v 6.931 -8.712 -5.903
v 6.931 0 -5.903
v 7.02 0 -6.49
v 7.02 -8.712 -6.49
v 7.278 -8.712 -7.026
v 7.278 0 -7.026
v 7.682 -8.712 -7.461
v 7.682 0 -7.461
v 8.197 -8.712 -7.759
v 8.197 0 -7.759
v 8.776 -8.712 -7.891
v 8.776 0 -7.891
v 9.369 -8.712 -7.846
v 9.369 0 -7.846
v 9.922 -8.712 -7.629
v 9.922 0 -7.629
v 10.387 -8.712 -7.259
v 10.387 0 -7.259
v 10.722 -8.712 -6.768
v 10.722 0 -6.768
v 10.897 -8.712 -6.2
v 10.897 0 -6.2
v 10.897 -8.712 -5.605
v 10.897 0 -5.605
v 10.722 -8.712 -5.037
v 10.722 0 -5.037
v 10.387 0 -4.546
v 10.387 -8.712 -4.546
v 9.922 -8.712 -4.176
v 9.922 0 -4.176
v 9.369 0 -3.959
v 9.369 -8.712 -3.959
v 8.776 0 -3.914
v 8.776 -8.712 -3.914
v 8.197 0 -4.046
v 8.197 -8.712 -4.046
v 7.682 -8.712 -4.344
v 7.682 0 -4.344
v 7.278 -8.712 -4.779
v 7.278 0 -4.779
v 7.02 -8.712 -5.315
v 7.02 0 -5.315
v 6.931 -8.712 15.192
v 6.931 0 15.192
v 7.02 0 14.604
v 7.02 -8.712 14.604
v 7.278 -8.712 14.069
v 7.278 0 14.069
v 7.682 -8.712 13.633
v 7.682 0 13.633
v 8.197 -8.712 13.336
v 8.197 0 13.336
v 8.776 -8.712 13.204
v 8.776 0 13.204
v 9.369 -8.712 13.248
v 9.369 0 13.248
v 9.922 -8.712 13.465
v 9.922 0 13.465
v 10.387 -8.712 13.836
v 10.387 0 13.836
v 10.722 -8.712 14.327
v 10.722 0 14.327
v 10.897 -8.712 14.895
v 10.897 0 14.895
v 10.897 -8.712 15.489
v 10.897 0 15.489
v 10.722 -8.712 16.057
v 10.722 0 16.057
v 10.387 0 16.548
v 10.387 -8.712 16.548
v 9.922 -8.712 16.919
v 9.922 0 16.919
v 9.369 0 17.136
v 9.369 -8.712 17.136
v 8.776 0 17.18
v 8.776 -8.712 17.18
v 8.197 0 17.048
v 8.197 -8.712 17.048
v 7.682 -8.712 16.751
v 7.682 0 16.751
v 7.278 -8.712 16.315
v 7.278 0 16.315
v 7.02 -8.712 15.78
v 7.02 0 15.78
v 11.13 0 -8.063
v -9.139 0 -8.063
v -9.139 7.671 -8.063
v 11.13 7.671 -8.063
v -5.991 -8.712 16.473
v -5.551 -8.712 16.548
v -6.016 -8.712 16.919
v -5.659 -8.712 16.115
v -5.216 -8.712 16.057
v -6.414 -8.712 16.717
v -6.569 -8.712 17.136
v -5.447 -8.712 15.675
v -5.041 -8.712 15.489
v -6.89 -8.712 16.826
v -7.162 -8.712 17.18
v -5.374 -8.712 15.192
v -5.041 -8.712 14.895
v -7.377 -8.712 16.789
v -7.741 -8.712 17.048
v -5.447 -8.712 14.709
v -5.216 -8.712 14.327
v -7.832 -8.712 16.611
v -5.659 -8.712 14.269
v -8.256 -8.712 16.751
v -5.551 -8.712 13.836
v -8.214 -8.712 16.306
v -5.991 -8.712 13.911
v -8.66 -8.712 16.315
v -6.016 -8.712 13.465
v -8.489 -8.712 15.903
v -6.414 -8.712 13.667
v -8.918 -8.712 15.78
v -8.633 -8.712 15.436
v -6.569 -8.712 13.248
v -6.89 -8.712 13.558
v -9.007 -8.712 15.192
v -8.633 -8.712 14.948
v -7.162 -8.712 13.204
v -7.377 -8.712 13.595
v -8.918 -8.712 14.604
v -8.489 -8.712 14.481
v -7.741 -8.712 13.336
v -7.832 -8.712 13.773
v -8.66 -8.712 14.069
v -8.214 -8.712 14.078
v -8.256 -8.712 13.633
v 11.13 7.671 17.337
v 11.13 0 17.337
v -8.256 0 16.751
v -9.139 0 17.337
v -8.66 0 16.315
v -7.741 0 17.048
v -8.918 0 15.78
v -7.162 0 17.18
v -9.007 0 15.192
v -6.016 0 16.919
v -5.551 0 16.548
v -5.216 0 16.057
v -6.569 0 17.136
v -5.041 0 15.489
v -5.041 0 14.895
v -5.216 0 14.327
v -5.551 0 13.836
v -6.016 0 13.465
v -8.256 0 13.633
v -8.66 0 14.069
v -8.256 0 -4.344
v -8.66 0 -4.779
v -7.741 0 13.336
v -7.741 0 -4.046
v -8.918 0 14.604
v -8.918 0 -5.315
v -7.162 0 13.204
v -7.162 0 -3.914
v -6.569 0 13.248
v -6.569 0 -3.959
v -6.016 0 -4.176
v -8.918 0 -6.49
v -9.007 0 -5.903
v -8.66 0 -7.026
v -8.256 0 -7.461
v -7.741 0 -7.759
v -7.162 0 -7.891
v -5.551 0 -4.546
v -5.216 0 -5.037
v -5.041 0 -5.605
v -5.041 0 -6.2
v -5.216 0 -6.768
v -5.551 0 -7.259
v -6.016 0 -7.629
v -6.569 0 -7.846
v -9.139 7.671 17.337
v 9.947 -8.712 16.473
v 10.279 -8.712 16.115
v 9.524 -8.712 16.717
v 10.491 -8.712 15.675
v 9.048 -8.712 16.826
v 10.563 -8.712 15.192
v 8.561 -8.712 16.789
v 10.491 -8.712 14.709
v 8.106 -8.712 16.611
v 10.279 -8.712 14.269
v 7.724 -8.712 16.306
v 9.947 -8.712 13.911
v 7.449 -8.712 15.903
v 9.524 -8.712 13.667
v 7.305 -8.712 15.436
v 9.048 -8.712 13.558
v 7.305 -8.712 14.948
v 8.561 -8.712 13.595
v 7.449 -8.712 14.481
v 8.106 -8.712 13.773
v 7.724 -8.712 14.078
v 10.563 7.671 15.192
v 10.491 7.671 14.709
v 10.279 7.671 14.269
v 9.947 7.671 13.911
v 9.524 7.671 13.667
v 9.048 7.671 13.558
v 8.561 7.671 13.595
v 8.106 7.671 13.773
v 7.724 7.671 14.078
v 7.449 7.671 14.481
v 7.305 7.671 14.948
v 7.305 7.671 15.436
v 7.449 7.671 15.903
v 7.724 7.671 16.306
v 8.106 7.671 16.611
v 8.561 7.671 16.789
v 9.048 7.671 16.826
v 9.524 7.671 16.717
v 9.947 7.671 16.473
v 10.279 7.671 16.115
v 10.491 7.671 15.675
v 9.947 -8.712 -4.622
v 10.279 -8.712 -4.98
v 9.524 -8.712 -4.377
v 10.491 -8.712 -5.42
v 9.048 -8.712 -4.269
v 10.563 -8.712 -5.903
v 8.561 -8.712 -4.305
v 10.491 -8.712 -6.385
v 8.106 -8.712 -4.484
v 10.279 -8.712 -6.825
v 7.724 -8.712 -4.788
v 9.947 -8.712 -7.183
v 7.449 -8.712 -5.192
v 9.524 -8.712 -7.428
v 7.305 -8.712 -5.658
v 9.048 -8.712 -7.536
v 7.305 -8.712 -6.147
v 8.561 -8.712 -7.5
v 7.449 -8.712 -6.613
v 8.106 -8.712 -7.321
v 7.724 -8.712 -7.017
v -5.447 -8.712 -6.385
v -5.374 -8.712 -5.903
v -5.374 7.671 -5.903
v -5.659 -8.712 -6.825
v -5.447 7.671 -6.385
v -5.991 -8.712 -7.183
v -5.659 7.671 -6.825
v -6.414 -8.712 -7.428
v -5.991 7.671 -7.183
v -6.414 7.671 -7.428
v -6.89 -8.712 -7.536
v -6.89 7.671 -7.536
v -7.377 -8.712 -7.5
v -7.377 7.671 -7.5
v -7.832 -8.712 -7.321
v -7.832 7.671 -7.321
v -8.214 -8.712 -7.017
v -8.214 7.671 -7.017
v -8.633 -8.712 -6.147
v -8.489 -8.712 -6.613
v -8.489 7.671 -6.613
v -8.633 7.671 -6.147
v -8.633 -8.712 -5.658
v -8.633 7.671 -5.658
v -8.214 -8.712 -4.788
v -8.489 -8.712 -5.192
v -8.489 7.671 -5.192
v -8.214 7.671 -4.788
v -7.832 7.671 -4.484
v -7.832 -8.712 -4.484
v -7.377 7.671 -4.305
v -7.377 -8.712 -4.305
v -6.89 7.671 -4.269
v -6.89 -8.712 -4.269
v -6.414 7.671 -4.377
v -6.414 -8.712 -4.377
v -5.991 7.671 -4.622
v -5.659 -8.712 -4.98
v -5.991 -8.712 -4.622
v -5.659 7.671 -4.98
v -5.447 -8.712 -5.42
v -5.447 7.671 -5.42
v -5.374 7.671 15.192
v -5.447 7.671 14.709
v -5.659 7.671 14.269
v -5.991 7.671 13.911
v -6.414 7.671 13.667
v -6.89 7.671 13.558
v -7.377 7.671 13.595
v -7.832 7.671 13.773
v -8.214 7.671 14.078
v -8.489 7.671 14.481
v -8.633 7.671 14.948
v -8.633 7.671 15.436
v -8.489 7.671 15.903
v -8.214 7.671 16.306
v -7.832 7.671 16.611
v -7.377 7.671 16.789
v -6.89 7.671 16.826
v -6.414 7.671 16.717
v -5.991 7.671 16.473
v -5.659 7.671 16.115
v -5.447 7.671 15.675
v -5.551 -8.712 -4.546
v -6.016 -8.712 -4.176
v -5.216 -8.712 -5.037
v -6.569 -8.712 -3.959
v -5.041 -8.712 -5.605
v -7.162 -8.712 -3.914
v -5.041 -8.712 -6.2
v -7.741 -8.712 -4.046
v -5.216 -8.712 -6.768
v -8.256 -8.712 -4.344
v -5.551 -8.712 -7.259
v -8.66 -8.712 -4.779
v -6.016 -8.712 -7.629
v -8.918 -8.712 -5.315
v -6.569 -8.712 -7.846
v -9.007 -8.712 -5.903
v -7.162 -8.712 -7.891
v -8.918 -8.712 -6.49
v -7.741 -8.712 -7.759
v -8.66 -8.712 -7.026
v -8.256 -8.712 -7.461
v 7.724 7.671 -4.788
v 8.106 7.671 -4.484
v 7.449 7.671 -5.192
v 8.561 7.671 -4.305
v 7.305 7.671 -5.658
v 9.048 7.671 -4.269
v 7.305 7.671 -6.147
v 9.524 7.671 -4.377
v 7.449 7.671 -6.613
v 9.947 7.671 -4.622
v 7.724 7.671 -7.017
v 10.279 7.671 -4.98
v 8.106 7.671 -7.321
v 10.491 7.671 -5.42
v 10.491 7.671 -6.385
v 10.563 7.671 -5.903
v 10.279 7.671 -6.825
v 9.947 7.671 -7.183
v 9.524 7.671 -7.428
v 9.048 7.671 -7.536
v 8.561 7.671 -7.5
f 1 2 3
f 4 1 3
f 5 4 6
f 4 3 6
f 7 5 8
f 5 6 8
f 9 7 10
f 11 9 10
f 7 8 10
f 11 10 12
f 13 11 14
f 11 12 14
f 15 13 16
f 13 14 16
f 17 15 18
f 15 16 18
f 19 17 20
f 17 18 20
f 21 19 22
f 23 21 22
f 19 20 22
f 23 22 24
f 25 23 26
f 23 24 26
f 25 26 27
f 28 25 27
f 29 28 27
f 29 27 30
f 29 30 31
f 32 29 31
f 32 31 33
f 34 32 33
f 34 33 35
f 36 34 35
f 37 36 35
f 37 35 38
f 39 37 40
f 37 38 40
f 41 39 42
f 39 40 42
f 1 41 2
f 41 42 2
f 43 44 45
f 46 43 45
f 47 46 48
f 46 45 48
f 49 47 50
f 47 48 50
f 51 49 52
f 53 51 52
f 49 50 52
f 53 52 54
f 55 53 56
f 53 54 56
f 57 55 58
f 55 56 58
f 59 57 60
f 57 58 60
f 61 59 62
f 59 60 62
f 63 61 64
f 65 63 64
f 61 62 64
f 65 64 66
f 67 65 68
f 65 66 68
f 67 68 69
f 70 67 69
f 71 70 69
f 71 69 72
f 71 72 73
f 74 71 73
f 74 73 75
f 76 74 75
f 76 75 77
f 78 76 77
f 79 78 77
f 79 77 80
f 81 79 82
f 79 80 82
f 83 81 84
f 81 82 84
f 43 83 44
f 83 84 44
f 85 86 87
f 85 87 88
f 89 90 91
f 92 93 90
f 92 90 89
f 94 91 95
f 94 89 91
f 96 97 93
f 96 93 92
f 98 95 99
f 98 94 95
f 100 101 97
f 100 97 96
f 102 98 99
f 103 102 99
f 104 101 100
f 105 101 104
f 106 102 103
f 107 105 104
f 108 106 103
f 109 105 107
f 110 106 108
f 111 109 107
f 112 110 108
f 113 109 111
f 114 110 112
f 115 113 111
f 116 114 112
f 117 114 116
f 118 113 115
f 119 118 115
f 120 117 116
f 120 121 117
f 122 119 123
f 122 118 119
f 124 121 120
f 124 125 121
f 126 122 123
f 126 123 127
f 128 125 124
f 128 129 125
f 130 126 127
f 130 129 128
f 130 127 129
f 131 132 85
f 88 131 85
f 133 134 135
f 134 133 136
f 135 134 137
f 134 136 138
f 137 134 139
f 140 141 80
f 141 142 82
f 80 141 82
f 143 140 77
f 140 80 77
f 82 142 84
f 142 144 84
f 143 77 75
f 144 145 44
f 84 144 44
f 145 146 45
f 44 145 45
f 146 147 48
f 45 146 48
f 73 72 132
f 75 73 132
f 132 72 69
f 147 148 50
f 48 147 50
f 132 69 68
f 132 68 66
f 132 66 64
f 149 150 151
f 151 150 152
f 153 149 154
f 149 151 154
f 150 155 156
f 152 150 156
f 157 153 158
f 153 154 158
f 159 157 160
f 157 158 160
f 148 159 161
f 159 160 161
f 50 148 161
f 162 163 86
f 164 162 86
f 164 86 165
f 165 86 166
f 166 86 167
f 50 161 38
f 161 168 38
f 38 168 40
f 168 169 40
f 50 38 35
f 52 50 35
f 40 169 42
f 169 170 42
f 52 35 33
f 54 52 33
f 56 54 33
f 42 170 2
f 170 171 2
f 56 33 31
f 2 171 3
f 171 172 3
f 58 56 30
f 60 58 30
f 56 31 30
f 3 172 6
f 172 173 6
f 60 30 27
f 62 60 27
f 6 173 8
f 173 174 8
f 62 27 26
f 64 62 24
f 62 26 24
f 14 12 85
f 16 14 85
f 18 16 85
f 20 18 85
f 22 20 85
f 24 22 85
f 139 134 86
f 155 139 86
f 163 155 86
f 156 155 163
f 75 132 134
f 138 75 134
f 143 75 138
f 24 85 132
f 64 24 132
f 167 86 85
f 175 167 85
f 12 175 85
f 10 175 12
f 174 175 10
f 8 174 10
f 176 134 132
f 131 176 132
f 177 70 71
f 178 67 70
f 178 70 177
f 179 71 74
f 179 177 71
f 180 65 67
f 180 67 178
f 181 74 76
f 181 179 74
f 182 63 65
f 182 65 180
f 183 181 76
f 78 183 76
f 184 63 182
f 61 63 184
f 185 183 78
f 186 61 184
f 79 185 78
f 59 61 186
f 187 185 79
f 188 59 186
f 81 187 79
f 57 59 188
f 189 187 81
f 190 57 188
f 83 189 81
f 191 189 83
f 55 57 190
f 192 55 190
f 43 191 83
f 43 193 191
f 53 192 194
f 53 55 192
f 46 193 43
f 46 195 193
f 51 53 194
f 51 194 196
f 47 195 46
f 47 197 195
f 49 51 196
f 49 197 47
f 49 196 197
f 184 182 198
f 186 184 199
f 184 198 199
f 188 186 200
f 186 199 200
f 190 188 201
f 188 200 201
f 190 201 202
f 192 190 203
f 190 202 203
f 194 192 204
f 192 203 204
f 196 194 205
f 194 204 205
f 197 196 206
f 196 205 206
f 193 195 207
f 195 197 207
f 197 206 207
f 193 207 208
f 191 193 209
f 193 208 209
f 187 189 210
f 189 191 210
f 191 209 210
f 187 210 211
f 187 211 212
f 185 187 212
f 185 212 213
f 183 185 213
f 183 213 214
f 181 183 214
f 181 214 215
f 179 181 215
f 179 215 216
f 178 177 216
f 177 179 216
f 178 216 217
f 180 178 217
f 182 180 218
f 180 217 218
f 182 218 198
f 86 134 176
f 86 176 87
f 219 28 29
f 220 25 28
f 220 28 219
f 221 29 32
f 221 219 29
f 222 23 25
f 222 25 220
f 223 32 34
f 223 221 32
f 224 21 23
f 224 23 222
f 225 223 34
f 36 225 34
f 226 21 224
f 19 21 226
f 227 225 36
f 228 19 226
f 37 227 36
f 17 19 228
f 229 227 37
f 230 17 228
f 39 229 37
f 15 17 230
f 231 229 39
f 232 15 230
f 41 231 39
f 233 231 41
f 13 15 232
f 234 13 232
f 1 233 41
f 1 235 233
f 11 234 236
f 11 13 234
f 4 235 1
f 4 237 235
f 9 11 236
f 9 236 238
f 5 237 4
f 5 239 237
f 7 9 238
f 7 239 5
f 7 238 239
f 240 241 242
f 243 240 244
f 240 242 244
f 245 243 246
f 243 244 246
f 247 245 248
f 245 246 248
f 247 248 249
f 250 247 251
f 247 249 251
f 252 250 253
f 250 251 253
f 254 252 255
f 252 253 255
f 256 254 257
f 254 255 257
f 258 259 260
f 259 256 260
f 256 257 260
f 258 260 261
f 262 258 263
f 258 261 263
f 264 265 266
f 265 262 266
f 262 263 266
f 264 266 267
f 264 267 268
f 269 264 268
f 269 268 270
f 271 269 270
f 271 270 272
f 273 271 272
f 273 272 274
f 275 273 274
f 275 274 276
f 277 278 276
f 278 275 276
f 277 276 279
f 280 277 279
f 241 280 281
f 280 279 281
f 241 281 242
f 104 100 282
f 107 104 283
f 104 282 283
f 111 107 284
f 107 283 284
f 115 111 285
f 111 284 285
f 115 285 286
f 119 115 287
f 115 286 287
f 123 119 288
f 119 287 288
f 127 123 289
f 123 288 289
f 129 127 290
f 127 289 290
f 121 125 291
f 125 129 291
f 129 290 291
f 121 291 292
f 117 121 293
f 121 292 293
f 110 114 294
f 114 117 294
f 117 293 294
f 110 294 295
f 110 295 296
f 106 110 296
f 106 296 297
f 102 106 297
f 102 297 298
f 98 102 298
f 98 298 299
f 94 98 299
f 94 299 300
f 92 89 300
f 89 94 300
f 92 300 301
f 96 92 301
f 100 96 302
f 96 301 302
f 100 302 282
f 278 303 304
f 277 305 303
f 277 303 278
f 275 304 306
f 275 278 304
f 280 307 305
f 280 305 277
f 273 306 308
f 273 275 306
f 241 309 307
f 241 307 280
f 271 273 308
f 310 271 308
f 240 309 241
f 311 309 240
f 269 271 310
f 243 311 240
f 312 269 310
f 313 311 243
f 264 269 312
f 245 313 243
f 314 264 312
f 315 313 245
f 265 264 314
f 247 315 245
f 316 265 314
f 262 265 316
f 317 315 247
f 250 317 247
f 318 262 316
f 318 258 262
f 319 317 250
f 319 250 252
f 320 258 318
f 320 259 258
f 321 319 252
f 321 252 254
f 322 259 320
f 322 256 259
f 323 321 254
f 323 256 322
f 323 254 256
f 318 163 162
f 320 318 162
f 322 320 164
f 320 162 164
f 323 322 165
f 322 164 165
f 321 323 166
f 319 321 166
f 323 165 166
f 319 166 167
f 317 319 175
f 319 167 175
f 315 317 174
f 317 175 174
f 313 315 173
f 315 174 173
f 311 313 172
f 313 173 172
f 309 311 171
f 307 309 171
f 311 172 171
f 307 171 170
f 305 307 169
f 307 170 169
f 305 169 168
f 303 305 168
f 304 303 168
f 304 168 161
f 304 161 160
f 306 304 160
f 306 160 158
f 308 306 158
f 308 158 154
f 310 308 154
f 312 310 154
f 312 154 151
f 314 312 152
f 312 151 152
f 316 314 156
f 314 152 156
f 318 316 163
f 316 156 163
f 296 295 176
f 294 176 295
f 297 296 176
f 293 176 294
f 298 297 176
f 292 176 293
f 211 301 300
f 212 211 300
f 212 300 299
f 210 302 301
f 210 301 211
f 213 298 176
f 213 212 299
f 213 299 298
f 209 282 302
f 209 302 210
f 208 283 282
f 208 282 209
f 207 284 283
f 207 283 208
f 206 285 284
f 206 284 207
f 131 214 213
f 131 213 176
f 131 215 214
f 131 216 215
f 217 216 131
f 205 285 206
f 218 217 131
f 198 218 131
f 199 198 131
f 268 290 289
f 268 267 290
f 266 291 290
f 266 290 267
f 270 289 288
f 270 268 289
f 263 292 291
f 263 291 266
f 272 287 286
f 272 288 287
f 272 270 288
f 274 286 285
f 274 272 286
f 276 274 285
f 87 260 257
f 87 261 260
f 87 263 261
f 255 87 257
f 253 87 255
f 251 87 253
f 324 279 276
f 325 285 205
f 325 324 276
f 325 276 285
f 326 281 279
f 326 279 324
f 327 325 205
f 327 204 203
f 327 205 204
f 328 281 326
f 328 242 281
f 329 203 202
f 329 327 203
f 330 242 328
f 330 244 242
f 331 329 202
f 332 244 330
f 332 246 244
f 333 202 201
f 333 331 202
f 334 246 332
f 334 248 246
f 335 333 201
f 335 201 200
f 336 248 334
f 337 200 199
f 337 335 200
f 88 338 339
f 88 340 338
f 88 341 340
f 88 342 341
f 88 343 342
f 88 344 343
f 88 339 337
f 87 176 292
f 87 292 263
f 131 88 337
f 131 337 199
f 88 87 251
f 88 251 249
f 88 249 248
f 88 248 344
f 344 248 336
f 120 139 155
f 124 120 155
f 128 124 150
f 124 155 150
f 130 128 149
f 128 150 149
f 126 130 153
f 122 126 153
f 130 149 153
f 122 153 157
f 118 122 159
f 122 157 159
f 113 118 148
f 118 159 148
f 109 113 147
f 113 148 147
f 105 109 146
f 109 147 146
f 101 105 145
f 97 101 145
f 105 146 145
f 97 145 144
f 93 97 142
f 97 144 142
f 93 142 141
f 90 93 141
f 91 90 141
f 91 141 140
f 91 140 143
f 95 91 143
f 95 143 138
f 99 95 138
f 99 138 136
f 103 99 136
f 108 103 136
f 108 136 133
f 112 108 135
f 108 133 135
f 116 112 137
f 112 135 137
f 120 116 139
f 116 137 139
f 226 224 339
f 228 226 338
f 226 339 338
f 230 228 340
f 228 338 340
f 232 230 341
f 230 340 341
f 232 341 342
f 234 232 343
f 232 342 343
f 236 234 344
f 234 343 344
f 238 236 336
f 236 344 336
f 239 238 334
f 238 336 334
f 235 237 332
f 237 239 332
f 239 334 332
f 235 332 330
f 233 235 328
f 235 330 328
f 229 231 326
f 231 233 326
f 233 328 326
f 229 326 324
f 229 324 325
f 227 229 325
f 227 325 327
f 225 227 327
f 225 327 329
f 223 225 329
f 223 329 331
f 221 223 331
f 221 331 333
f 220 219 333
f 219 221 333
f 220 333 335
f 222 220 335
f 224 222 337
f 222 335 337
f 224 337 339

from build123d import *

# Parameters (mm, degrees)
SKETCH1_W               = 20.2692
SKETCH1_H               = 25.4
BOSS_EXTRUDE1_DEPTH     = 7.6708
SKETCH2_R               = 1.9939
SKETCH2_R_2             = 1.6383
BOSS_EXTRUDE2_DEPTH     = 8.7122
SKETCH3_R               = 1.6383
CUT_EXTRUDE1_DEPTH      = 1
CUT_EXTRUDE1_DEPTH_BACK = 17.383


with BuildPart() as part:
    # Sketch1 → Boss-Extrude1 (new body)
    with BuildSketch(Plane(origin=(0, 0, 0), x_dir=(1, 0, 0), z_dir=(0, 1, 0))):
        with Locations((0.995181162, -4.637001603)):
            Rectangle(SKETCH1_W, SKETCH1_H)
    extrude(amount=BOSS_EXTRUDE1_DEPTH)

    # Sketch2 → Boss-Extrude2 (add)
    with BuildSketch(Plane(origin=(0, 0, 0), x_dir=(-1, 0, 0), z_dir=(0, -1, 0))):
        with Locations((7.01266761, -15.1920941)):
            Circle(SKETCH2_R)
        with Locations((7.01266761, -15.1920941)):
            Circle(SKETCH2_R_2, mode=Mode.SUBTRACT)
        with Locations((-8.925132573, -15.1920941)):
            Circle(SKETCH2_R)
        with Locations((-8.925132573, -15.1920941)):
            Circle(SKETCH2_R_2, mode=Mode.SUBTRACT)
        with Locations((-8.925132573, 5.902511421)):
            Circle(SKETCH2_R)
        with Locations((-8.925132573, 5.902511421)):
            Circle(SKETCH2_R_2, mode=Mode.SUBTRACT)
        with Locations((7.01266761, 5.902511421)):
            Circle(SKETCH2_R)
        with Locations((7.01266761, 5.902511421)):
            Circle(SKETCH2_R_2, mode=Mode.SUBTRACT)
    extrude(amount=BOSS_EXTRUDE2_DEPTH)

    # Sketch3 → Cut-Extrude1 (cut, two sides)
    with BuildSketch(Plane(origin=(0, 7.6708, 0), x_dir=(1, 0, 0), z_dir=(0, 1, 0))) as cut_extrude1_sk:
        with Locations((8.925132573, 5.902511421)):
            Circle(SKETCH3_R)
        with Locations((-7.01266761, 5.902511421)):
            Circle(SKETCH3_R)
        with Locations((8.925132573, -15.1920941)):
            Circle(SKETCH3_R)
        with Locations((-7.01266761, -15.1920941)):
            Circle(SKETCH3_R)
    extrude(amount=CUT_EXTRUDE1_DEPTH, mode=Mode.SUBTRACT)
    extrude(cut_extrude1_sk.sketch, amount=-CUT_EXTRUDE1_DEPTH_BACK, mode=Mode.SUBTRACT)


solid = part.part
